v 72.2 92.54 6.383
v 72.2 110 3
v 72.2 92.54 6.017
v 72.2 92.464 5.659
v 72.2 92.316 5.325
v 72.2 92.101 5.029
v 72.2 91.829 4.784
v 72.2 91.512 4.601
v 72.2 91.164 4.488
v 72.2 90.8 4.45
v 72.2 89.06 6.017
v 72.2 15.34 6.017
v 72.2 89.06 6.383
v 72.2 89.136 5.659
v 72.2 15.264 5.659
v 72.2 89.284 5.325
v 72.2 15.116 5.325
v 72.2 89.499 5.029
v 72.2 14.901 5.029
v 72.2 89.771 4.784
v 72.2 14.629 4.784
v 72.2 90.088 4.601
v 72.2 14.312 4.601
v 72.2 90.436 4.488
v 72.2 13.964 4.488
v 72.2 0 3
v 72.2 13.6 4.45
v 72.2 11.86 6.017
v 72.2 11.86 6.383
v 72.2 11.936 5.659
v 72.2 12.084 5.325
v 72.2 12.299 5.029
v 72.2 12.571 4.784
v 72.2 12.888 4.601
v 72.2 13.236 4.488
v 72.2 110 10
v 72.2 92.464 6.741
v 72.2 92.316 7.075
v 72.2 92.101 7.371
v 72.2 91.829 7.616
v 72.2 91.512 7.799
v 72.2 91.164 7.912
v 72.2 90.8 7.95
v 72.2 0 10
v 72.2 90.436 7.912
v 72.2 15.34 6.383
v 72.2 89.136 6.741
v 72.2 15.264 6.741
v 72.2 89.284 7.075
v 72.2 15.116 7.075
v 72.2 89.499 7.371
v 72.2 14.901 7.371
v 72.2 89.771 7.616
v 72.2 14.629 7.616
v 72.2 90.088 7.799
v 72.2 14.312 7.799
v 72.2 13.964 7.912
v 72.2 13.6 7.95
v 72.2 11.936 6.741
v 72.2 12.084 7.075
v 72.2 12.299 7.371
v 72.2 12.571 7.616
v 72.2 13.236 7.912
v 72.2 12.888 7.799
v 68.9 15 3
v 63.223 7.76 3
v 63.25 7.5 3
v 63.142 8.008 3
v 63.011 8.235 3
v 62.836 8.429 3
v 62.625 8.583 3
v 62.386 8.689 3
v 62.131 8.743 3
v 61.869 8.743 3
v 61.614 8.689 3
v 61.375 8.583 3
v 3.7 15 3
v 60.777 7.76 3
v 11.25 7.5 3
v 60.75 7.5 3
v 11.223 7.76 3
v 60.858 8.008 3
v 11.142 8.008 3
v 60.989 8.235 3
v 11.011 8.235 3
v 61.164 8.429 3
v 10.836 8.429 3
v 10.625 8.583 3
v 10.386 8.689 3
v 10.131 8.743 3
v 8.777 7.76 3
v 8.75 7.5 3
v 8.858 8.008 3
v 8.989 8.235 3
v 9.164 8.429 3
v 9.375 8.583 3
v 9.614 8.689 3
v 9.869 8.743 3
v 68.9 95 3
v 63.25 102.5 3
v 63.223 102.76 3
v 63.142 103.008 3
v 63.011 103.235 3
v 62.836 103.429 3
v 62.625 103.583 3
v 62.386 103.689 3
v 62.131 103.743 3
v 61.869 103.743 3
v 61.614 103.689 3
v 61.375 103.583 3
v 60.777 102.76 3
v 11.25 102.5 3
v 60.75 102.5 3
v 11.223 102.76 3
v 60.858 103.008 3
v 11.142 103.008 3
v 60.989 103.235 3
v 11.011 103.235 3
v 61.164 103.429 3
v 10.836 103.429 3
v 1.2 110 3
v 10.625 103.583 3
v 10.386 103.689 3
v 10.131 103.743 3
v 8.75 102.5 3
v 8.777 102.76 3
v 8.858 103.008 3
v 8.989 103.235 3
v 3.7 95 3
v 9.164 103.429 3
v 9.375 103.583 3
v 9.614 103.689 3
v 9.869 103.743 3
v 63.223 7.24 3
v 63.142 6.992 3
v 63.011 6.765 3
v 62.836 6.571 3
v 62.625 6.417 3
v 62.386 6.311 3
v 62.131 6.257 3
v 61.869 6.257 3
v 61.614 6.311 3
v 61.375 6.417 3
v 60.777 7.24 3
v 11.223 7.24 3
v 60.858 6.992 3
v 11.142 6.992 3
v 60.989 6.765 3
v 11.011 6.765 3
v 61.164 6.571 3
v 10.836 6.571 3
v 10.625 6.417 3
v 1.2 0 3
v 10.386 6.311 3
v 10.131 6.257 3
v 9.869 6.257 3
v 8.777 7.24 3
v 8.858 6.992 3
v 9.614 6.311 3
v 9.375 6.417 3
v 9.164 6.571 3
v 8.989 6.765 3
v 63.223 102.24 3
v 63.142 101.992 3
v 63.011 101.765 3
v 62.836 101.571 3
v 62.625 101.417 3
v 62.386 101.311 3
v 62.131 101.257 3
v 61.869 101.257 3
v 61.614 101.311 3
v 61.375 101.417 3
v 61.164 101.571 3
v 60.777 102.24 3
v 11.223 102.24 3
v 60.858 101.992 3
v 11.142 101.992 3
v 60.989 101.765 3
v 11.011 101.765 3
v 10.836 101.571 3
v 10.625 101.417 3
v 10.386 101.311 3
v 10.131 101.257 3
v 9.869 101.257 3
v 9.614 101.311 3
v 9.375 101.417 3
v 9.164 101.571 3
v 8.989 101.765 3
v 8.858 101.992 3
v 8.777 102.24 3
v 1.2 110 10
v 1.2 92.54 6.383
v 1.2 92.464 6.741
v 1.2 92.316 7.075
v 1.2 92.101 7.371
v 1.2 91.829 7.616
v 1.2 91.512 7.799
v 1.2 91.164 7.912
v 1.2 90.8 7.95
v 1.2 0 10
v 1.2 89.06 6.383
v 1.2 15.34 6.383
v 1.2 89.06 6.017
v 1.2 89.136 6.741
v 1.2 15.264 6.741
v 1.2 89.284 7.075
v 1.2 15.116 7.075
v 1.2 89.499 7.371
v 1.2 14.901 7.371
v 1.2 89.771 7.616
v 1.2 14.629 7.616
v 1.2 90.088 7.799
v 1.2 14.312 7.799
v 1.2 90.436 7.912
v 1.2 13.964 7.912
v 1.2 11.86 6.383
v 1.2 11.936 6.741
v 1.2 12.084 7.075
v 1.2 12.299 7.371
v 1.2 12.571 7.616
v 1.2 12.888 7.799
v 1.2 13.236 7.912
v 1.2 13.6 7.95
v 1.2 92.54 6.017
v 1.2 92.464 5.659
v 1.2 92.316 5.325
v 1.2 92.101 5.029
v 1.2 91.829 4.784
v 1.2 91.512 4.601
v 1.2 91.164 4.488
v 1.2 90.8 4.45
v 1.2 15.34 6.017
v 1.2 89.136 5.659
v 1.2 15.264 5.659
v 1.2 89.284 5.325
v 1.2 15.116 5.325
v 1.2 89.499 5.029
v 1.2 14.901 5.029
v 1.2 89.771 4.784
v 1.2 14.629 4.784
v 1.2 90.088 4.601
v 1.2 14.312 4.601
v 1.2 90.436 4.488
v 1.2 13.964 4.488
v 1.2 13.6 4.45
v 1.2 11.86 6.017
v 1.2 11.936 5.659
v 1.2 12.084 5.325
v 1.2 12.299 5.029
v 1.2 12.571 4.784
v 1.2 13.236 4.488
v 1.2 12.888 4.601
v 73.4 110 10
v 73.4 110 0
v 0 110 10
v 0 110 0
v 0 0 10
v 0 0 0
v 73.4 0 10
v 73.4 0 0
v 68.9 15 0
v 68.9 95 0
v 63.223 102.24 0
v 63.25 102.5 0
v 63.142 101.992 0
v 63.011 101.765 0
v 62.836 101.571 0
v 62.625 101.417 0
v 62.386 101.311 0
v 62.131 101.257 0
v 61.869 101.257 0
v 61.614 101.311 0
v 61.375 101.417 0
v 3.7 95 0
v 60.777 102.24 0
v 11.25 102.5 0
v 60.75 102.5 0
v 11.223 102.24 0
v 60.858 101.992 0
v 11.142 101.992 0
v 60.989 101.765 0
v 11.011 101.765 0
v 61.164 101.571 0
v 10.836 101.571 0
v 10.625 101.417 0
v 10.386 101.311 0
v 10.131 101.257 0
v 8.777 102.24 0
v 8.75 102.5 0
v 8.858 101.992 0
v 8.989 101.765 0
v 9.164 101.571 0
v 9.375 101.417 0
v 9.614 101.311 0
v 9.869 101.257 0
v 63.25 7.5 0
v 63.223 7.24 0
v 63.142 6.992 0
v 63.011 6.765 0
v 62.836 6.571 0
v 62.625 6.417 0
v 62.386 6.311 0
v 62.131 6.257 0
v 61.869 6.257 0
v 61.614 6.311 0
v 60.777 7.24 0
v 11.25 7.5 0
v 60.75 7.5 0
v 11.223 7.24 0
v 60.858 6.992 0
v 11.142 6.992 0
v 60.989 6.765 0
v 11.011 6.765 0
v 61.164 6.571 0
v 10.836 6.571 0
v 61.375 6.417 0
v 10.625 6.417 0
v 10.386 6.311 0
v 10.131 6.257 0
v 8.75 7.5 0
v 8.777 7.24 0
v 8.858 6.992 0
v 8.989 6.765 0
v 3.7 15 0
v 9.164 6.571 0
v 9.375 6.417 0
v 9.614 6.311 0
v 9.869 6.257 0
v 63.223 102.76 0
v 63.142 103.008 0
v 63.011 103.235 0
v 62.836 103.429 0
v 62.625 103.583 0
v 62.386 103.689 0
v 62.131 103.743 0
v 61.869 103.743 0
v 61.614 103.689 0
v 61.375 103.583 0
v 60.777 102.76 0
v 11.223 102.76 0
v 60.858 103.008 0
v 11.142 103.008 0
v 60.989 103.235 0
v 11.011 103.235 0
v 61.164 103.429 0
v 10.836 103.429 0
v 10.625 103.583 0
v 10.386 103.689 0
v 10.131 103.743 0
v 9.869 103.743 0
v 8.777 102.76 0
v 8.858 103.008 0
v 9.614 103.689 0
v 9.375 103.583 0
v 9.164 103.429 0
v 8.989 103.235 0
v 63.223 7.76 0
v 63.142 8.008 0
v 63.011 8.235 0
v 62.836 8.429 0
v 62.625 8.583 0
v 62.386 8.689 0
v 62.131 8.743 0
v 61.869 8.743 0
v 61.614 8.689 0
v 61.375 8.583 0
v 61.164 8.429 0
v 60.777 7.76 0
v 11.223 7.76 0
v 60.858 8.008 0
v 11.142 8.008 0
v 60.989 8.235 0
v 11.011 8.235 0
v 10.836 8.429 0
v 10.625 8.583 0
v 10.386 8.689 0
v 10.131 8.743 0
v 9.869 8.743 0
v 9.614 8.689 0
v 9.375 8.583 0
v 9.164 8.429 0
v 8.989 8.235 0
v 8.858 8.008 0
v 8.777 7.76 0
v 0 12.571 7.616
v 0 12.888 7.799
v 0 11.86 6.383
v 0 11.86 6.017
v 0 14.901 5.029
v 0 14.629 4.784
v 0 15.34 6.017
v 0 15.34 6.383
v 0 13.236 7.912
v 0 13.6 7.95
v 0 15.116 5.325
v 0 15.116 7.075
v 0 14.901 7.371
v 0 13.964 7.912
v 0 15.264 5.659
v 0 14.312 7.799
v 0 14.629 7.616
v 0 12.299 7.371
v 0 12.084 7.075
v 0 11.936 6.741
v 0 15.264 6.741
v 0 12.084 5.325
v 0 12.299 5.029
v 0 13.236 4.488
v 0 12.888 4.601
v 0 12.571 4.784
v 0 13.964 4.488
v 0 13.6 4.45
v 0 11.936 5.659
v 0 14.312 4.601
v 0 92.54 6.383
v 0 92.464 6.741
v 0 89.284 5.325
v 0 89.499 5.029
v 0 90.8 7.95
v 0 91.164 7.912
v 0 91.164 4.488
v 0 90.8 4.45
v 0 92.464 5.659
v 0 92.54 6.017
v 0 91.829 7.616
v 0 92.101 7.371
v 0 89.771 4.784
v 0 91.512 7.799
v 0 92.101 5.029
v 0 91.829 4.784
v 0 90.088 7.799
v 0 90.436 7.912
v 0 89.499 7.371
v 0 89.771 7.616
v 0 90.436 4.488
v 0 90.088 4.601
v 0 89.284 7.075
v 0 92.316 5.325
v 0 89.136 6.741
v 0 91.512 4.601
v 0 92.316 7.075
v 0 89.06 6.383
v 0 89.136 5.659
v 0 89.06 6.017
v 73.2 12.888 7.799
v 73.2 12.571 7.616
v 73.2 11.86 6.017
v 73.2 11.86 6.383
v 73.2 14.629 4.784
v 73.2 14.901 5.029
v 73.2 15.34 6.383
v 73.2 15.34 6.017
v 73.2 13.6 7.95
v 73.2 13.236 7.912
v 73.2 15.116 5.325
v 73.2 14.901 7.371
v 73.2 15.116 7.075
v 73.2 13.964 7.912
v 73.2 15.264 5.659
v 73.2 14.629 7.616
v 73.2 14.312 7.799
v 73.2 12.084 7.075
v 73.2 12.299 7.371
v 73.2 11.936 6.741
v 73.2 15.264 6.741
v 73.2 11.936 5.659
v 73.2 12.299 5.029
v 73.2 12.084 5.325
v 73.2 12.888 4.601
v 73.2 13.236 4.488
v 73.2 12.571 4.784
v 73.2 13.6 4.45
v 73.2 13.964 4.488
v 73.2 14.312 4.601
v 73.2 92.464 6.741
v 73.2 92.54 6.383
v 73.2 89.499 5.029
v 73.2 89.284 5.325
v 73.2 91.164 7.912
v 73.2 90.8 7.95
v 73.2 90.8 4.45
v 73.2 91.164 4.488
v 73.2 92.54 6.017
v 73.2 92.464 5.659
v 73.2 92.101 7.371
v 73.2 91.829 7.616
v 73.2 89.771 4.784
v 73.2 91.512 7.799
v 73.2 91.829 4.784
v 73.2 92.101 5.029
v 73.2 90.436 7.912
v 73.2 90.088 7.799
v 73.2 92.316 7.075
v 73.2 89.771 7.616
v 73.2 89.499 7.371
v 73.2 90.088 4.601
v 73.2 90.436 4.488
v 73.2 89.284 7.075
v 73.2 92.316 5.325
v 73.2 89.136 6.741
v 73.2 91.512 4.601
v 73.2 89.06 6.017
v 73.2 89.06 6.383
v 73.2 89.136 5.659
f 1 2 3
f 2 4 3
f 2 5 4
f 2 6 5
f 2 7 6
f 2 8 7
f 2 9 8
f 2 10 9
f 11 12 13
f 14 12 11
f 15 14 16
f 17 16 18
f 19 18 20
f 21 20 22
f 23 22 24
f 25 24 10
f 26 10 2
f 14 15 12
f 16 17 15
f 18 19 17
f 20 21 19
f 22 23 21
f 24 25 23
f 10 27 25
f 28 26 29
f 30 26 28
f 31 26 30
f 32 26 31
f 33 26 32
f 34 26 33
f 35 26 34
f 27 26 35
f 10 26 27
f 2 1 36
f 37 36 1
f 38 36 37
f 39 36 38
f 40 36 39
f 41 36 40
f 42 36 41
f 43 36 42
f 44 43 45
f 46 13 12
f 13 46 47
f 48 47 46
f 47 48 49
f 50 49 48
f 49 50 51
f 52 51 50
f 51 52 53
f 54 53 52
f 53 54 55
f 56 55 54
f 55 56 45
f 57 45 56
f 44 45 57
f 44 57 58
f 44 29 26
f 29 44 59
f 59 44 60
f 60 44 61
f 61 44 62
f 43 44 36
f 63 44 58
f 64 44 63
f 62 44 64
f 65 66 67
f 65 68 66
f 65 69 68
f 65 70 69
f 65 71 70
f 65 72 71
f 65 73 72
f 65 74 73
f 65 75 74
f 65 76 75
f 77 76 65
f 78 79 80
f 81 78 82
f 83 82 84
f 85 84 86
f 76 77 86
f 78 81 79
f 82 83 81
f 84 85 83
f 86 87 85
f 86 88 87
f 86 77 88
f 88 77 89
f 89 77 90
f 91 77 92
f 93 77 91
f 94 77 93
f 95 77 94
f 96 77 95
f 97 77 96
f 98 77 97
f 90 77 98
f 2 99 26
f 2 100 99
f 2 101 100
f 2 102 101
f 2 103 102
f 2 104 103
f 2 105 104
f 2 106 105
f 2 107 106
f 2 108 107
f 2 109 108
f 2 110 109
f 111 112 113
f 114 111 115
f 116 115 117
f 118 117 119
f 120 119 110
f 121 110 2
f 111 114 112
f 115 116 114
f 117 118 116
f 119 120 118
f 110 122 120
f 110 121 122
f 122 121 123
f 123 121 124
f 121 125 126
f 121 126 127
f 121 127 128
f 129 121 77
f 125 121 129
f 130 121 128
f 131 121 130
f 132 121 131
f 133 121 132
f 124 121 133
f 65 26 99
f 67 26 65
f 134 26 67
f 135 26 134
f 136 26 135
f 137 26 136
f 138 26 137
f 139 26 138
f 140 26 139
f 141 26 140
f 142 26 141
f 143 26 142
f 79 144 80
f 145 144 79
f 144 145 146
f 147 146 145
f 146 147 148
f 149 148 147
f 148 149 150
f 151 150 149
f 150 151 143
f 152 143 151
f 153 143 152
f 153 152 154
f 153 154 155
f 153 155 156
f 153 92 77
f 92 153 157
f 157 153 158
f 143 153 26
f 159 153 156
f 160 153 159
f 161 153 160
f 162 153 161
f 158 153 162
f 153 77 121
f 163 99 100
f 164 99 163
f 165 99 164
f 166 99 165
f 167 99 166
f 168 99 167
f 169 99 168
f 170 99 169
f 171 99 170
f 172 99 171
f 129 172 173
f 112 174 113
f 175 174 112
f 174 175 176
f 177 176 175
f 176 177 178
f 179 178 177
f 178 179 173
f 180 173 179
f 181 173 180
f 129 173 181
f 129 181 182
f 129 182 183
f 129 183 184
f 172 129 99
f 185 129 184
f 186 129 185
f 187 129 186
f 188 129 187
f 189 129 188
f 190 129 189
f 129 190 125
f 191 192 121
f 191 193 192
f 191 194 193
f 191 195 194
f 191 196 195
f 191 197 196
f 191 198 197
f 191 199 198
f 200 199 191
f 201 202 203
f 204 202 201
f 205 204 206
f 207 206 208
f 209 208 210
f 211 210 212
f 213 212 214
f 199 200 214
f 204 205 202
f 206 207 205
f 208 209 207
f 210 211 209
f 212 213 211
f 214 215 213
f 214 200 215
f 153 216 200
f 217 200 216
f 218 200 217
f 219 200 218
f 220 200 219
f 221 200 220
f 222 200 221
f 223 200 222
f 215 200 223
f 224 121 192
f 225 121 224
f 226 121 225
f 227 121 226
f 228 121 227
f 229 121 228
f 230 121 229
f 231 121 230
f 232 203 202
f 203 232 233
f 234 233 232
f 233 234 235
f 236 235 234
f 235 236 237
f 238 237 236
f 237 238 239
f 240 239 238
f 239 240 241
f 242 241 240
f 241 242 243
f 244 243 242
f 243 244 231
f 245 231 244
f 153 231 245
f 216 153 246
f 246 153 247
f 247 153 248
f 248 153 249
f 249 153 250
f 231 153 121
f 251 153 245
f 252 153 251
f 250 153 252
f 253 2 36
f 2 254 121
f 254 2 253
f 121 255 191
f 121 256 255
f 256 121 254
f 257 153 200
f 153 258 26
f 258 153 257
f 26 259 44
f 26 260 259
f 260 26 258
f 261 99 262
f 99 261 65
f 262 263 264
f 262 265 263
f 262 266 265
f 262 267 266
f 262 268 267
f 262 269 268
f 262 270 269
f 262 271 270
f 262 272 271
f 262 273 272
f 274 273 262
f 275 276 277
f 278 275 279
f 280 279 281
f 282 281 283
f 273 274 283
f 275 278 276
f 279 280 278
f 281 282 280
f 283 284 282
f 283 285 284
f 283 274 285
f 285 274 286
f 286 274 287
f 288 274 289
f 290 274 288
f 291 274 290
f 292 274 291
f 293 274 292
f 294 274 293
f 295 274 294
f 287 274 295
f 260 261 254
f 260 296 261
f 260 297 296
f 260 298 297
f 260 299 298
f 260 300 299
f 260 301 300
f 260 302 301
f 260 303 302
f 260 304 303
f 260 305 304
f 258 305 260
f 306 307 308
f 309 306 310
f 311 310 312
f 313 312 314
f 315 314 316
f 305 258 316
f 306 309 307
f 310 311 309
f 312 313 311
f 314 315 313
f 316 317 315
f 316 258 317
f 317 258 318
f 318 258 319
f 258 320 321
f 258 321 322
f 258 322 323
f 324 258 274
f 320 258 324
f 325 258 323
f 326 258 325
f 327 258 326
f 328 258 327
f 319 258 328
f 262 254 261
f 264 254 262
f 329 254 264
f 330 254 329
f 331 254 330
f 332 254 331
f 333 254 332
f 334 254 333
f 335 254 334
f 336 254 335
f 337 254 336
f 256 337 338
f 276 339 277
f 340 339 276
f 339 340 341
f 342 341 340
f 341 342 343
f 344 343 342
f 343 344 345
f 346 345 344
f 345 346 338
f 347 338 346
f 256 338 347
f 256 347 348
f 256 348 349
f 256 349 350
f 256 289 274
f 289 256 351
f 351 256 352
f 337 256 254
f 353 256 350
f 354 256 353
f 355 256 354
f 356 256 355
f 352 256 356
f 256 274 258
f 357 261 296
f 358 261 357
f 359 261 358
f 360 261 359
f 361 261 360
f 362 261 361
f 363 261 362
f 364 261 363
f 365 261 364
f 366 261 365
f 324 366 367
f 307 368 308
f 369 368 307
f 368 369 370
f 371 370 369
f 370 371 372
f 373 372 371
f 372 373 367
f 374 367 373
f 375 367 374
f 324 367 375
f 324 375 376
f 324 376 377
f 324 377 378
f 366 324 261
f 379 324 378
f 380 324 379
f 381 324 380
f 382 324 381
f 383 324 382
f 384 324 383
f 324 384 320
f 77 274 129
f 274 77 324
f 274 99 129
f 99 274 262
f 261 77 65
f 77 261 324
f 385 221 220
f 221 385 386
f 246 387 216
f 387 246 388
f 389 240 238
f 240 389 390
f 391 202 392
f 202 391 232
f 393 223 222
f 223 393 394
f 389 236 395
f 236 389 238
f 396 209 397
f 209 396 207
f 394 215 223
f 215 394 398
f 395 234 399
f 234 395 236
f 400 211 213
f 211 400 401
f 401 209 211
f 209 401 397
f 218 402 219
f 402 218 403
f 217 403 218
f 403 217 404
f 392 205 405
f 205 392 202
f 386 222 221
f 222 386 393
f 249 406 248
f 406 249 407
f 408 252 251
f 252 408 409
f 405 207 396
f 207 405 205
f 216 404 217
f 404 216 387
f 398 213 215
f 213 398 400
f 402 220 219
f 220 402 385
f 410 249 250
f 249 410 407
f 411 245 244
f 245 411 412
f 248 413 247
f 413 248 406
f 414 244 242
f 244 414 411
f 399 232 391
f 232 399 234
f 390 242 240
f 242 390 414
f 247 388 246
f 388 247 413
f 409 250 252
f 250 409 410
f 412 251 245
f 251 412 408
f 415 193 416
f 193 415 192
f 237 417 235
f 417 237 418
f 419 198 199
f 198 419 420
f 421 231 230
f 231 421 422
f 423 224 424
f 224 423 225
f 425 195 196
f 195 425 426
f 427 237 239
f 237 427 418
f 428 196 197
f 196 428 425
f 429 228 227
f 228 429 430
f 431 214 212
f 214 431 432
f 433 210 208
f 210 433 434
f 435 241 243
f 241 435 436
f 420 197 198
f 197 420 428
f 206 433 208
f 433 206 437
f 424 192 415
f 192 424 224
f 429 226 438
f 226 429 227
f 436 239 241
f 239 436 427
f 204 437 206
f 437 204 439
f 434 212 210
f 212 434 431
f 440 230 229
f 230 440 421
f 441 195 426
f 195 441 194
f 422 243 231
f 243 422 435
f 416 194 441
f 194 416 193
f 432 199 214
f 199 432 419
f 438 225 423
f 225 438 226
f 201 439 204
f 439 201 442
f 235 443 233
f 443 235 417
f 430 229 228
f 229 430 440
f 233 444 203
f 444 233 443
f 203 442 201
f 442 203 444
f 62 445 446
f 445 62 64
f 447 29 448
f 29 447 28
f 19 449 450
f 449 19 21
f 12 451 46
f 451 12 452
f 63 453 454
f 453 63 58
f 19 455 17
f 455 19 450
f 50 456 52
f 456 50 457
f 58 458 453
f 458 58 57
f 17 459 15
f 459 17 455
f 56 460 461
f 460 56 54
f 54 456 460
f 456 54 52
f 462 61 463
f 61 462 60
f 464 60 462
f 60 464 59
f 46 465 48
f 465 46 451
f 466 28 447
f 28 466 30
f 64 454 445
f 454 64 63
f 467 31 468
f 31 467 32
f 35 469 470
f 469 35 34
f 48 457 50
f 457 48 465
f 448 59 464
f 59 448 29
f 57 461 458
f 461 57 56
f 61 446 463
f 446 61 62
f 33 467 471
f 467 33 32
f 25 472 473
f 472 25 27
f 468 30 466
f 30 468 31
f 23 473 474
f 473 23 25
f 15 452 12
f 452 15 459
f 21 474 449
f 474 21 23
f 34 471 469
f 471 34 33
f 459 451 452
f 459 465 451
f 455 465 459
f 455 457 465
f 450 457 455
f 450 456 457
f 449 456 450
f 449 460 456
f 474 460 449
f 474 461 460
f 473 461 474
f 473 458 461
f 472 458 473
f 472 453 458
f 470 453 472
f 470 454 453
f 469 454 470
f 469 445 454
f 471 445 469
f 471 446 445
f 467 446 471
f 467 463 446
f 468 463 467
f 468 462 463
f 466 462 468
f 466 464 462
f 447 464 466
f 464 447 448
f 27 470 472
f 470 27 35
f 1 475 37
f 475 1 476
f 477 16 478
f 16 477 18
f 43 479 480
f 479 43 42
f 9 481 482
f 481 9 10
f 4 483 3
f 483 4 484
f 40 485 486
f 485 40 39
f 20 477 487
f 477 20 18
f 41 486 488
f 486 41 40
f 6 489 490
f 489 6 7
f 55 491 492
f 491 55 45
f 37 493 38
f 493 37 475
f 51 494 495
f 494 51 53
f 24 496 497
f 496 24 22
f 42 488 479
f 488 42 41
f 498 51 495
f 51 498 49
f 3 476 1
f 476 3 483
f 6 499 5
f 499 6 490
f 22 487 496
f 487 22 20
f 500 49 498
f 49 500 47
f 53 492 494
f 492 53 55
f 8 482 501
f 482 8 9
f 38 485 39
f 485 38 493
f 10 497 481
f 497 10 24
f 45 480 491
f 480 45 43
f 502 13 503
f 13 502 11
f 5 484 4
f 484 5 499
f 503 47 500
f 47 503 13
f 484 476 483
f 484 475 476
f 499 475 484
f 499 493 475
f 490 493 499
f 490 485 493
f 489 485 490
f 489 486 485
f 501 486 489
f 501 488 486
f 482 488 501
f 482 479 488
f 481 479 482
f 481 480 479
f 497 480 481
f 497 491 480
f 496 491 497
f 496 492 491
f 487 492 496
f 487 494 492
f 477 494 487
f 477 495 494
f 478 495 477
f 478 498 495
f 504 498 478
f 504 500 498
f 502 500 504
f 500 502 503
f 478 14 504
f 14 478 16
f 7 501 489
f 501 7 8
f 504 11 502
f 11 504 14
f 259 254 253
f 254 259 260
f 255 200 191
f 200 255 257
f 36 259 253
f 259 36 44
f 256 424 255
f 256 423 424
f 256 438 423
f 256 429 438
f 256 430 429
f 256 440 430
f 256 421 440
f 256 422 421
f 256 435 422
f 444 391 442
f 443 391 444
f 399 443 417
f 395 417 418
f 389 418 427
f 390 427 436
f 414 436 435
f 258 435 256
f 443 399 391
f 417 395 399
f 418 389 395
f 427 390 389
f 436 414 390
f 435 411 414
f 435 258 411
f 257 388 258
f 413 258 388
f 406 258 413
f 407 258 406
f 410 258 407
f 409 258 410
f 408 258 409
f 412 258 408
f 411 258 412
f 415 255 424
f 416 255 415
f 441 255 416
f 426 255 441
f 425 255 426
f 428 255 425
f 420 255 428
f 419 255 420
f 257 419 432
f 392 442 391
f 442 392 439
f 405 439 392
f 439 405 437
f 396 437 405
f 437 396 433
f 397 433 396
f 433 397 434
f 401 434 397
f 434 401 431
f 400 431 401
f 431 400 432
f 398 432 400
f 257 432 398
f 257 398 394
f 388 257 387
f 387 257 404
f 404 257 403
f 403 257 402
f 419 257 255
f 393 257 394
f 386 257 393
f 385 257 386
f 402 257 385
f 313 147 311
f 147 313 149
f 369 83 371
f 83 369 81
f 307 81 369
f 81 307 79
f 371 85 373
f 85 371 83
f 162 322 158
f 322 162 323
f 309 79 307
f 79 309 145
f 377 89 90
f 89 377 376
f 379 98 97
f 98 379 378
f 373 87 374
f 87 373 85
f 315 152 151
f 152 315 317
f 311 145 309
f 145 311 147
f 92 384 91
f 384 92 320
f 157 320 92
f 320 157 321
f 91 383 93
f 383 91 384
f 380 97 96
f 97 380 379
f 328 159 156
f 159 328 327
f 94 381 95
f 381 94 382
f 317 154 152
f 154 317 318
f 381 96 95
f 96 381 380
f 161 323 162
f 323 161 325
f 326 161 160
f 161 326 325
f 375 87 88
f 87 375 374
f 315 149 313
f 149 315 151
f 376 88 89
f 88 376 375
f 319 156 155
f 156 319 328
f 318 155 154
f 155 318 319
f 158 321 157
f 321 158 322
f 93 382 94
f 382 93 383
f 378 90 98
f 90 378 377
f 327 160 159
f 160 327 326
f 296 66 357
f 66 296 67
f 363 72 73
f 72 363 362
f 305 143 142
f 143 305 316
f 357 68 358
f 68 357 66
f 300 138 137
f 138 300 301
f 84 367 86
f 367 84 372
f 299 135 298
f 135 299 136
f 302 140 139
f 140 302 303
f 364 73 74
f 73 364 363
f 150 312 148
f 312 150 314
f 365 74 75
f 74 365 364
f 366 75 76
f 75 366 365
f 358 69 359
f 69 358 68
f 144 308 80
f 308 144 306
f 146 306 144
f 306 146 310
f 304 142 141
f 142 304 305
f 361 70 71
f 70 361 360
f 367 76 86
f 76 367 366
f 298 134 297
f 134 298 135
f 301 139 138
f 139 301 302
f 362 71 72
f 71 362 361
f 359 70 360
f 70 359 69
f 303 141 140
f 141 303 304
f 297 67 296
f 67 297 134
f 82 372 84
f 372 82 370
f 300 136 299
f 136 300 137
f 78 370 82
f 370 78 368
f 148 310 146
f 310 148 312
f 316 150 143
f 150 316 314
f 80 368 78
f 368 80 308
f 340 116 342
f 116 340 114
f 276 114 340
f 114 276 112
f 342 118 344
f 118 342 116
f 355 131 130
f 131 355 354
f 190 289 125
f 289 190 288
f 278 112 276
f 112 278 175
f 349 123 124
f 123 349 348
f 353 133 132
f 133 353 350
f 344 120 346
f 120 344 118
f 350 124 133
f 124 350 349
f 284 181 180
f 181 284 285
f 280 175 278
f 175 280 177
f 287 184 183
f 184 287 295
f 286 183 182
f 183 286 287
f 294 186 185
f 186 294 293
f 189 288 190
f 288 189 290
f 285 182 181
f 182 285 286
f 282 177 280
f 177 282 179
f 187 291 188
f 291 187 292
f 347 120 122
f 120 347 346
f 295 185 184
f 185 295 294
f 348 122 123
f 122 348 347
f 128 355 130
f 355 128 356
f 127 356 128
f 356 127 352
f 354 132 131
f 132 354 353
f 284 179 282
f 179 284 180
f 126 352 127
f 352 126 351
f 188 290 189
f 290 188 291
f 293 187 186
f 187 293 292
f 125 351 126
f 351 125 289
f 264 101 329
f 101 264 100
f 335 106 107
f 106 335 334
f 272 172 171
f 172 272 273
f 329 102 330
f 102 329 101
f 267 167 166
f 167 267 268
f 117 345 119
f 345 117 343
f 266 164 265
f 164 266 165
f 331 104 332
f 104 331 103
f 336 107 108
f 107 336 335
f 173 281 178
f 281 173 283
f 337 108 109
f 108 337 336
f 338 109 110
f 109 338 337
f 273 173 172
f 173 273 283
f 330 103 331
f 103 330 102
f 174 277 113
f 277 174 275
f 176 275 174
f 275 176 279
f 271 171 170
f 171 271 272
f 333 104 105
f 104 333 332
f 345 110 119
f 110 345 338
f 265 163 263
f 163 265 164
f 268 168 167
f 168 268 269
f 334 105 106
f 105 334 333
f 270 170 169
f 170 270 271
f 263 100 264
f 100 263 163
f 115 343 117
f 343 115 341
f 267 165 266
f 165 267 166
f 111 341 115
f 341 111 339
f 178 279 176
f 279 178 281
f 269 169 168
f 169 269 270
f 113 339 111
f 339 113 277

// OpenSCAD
// file: common.scad
card_spacing = 20.32;

module mock_mobo() {
    $fn=50;
    difference() {
        cube([350, 193, 2]);
        translate([350-16.5,10,0]) cylinder(d=4, h=3);
        translate([350-16.5,193-27.7,0]) cylinder(d=4, h=3);

        translate([350-95.2,10,0]) cylinder(d=4, h=3);

        translate([350-141,10,0]) cylinder(d=4, h=3);
        translate([350-141,193-27.7,0]) cylinder(d=4, h=3);

        translate([6.3,33.2,0]) cylinder(d=4, h=3);
        translate([6.3,193-27.7,0]) cylinder(d=4, h=3);
    }
}

module mock_card() {
    $fn=50;
    cube([200, 2, 106.7]);
    translate([-12.3, -15.8+22-19.4, -18.8+119.2]) difference() {
        cube([12.3,19.4,1]);
        translate([6.3, 19.4-1-4.8/2,0]) hull() {
            cylinder(d=4.8,h=2, $fn=40);
            translate([0,5,0]) cylinder(d=4.8,h=2, $fn=40);
        }
    }
    difference() {
        translate([-1,-15.8, -18.8]) cube([1,22, 120.2]);
        translate([-1.3,-15.8, -18.8]) cube([2,(18.8-10.6)/2, 11.2]);
        translate([-1.3,-15.8+10.6+(18.8-10.6)/2, -18.8]) cube([2,(18.8-10.6)/2, 11.2]);
        translate([-1.3,-15.8+18.8, -18.8]) cube([2,5, 116.2]);
        translate([-1.3,-15.8, -18.8+116.2]) cube([2,22-18.8, 5]);
    }
    
}

module mock_mobo_card() {
    
    mock_mobo();
    translate([350-142,-1.2,18.8-10.4]) rotate([0,0,90]) mock_card();
    translate([350-142+card_spacing,-1.2,18.8-10.4]) rotate([0,0,90]) mock_card();
    translate([350-142+2*card_spacing,-1.2,18.8-10.4]) rotate([0,0,90]) mock_card();
    translate([350-142+3*card_spacing,-1.2,18.8-10.4]) rotate([0,0,90]) mock_card();
    translate([350-142+4*card_spacing,-1.2,18.8-10.4]) rotate([0,0,90]) mock_card();
    translate([350-142+5*card_spacing,-1.2,18.8-10.4]) rotate([0,0,90]) mock_card();
    translate([350-142+6*card_spacing,-1.2,18.8-10.4]) rotate([0,0,90]) mock_card();
}

module mock_ssd() {
    difference() {
        cube([70, 100, 7.1]);
        translate([9.4,0,6.5]) cube([41.4,7,1]);
        translate([10.4,0,0]) cube([39.4,7,2]);
    }
    translate([0,13.6,3]) rotate([0,-90,0]) cylinder(d=2.5, h=5, $fn=30);
    translate([0,100-9.2,3]) rotate([0,-90,0]) cylinder(d=2.5, h=5, $fn=30);

    translate([70+5,13.6,3]) rotate([0,-90,0]) cylinder(d=2.5, h=5, $fn=30);
    translate([70+5,100-9.2,3]) rotate([0,-90,0]) cylinder(d=2.5, h=5, $fn=30);

}

//mock_mobo();
//mock_card();
//mock_mobo_card();
//mock_ssd();
// main file
include <common.scad>;

//%translate([1,0,3.2]) mock_ssd();

side_w = 1.2;
gap = 1;

module ssd_rack() {
    difference() {
        cube([70 + 2*side_w + gap,110,10]);
        translate([side_w, 0, 3]) {
            cube([70+gap,110,10]);
            translate([2.5,15,-3]) cube([65.2,80,10]);
            translate([2,13.6,3.2]) rotate([0,-90,0]) cylinder(d=3.5, h=5, $fn=30);
            translate([2,100-9.2,3.2]) rotate([0,-90,0]) cylinder(d=3.5, h=5, $fn=30);

            translate([70+2,13.6,3.2]) rotate([0,-90,0]) cylinder(d=3.5, h=5, $fn=30);
            translate([70+2,100-9.2,3.2]) rotate([0,-90,0]) cylinder(d=3.5, h=5, $fn=30);
        }
        translate([10, 15/2, 0]) cylinder(d=2.5, h=5, $fn=30);
        translate([72-10, 15/2, 0]) cylinder(d=2.5, h=5, $fn=30);
        
        translate([10, 110-15/2, 0]) cylinder(d=2.5, h=5, $fn=30);
        translate([72-10, 110-15/2, 0]) cylinder(d=2.5, h=5, $fn=30);

    }
}

ssd_rack();
